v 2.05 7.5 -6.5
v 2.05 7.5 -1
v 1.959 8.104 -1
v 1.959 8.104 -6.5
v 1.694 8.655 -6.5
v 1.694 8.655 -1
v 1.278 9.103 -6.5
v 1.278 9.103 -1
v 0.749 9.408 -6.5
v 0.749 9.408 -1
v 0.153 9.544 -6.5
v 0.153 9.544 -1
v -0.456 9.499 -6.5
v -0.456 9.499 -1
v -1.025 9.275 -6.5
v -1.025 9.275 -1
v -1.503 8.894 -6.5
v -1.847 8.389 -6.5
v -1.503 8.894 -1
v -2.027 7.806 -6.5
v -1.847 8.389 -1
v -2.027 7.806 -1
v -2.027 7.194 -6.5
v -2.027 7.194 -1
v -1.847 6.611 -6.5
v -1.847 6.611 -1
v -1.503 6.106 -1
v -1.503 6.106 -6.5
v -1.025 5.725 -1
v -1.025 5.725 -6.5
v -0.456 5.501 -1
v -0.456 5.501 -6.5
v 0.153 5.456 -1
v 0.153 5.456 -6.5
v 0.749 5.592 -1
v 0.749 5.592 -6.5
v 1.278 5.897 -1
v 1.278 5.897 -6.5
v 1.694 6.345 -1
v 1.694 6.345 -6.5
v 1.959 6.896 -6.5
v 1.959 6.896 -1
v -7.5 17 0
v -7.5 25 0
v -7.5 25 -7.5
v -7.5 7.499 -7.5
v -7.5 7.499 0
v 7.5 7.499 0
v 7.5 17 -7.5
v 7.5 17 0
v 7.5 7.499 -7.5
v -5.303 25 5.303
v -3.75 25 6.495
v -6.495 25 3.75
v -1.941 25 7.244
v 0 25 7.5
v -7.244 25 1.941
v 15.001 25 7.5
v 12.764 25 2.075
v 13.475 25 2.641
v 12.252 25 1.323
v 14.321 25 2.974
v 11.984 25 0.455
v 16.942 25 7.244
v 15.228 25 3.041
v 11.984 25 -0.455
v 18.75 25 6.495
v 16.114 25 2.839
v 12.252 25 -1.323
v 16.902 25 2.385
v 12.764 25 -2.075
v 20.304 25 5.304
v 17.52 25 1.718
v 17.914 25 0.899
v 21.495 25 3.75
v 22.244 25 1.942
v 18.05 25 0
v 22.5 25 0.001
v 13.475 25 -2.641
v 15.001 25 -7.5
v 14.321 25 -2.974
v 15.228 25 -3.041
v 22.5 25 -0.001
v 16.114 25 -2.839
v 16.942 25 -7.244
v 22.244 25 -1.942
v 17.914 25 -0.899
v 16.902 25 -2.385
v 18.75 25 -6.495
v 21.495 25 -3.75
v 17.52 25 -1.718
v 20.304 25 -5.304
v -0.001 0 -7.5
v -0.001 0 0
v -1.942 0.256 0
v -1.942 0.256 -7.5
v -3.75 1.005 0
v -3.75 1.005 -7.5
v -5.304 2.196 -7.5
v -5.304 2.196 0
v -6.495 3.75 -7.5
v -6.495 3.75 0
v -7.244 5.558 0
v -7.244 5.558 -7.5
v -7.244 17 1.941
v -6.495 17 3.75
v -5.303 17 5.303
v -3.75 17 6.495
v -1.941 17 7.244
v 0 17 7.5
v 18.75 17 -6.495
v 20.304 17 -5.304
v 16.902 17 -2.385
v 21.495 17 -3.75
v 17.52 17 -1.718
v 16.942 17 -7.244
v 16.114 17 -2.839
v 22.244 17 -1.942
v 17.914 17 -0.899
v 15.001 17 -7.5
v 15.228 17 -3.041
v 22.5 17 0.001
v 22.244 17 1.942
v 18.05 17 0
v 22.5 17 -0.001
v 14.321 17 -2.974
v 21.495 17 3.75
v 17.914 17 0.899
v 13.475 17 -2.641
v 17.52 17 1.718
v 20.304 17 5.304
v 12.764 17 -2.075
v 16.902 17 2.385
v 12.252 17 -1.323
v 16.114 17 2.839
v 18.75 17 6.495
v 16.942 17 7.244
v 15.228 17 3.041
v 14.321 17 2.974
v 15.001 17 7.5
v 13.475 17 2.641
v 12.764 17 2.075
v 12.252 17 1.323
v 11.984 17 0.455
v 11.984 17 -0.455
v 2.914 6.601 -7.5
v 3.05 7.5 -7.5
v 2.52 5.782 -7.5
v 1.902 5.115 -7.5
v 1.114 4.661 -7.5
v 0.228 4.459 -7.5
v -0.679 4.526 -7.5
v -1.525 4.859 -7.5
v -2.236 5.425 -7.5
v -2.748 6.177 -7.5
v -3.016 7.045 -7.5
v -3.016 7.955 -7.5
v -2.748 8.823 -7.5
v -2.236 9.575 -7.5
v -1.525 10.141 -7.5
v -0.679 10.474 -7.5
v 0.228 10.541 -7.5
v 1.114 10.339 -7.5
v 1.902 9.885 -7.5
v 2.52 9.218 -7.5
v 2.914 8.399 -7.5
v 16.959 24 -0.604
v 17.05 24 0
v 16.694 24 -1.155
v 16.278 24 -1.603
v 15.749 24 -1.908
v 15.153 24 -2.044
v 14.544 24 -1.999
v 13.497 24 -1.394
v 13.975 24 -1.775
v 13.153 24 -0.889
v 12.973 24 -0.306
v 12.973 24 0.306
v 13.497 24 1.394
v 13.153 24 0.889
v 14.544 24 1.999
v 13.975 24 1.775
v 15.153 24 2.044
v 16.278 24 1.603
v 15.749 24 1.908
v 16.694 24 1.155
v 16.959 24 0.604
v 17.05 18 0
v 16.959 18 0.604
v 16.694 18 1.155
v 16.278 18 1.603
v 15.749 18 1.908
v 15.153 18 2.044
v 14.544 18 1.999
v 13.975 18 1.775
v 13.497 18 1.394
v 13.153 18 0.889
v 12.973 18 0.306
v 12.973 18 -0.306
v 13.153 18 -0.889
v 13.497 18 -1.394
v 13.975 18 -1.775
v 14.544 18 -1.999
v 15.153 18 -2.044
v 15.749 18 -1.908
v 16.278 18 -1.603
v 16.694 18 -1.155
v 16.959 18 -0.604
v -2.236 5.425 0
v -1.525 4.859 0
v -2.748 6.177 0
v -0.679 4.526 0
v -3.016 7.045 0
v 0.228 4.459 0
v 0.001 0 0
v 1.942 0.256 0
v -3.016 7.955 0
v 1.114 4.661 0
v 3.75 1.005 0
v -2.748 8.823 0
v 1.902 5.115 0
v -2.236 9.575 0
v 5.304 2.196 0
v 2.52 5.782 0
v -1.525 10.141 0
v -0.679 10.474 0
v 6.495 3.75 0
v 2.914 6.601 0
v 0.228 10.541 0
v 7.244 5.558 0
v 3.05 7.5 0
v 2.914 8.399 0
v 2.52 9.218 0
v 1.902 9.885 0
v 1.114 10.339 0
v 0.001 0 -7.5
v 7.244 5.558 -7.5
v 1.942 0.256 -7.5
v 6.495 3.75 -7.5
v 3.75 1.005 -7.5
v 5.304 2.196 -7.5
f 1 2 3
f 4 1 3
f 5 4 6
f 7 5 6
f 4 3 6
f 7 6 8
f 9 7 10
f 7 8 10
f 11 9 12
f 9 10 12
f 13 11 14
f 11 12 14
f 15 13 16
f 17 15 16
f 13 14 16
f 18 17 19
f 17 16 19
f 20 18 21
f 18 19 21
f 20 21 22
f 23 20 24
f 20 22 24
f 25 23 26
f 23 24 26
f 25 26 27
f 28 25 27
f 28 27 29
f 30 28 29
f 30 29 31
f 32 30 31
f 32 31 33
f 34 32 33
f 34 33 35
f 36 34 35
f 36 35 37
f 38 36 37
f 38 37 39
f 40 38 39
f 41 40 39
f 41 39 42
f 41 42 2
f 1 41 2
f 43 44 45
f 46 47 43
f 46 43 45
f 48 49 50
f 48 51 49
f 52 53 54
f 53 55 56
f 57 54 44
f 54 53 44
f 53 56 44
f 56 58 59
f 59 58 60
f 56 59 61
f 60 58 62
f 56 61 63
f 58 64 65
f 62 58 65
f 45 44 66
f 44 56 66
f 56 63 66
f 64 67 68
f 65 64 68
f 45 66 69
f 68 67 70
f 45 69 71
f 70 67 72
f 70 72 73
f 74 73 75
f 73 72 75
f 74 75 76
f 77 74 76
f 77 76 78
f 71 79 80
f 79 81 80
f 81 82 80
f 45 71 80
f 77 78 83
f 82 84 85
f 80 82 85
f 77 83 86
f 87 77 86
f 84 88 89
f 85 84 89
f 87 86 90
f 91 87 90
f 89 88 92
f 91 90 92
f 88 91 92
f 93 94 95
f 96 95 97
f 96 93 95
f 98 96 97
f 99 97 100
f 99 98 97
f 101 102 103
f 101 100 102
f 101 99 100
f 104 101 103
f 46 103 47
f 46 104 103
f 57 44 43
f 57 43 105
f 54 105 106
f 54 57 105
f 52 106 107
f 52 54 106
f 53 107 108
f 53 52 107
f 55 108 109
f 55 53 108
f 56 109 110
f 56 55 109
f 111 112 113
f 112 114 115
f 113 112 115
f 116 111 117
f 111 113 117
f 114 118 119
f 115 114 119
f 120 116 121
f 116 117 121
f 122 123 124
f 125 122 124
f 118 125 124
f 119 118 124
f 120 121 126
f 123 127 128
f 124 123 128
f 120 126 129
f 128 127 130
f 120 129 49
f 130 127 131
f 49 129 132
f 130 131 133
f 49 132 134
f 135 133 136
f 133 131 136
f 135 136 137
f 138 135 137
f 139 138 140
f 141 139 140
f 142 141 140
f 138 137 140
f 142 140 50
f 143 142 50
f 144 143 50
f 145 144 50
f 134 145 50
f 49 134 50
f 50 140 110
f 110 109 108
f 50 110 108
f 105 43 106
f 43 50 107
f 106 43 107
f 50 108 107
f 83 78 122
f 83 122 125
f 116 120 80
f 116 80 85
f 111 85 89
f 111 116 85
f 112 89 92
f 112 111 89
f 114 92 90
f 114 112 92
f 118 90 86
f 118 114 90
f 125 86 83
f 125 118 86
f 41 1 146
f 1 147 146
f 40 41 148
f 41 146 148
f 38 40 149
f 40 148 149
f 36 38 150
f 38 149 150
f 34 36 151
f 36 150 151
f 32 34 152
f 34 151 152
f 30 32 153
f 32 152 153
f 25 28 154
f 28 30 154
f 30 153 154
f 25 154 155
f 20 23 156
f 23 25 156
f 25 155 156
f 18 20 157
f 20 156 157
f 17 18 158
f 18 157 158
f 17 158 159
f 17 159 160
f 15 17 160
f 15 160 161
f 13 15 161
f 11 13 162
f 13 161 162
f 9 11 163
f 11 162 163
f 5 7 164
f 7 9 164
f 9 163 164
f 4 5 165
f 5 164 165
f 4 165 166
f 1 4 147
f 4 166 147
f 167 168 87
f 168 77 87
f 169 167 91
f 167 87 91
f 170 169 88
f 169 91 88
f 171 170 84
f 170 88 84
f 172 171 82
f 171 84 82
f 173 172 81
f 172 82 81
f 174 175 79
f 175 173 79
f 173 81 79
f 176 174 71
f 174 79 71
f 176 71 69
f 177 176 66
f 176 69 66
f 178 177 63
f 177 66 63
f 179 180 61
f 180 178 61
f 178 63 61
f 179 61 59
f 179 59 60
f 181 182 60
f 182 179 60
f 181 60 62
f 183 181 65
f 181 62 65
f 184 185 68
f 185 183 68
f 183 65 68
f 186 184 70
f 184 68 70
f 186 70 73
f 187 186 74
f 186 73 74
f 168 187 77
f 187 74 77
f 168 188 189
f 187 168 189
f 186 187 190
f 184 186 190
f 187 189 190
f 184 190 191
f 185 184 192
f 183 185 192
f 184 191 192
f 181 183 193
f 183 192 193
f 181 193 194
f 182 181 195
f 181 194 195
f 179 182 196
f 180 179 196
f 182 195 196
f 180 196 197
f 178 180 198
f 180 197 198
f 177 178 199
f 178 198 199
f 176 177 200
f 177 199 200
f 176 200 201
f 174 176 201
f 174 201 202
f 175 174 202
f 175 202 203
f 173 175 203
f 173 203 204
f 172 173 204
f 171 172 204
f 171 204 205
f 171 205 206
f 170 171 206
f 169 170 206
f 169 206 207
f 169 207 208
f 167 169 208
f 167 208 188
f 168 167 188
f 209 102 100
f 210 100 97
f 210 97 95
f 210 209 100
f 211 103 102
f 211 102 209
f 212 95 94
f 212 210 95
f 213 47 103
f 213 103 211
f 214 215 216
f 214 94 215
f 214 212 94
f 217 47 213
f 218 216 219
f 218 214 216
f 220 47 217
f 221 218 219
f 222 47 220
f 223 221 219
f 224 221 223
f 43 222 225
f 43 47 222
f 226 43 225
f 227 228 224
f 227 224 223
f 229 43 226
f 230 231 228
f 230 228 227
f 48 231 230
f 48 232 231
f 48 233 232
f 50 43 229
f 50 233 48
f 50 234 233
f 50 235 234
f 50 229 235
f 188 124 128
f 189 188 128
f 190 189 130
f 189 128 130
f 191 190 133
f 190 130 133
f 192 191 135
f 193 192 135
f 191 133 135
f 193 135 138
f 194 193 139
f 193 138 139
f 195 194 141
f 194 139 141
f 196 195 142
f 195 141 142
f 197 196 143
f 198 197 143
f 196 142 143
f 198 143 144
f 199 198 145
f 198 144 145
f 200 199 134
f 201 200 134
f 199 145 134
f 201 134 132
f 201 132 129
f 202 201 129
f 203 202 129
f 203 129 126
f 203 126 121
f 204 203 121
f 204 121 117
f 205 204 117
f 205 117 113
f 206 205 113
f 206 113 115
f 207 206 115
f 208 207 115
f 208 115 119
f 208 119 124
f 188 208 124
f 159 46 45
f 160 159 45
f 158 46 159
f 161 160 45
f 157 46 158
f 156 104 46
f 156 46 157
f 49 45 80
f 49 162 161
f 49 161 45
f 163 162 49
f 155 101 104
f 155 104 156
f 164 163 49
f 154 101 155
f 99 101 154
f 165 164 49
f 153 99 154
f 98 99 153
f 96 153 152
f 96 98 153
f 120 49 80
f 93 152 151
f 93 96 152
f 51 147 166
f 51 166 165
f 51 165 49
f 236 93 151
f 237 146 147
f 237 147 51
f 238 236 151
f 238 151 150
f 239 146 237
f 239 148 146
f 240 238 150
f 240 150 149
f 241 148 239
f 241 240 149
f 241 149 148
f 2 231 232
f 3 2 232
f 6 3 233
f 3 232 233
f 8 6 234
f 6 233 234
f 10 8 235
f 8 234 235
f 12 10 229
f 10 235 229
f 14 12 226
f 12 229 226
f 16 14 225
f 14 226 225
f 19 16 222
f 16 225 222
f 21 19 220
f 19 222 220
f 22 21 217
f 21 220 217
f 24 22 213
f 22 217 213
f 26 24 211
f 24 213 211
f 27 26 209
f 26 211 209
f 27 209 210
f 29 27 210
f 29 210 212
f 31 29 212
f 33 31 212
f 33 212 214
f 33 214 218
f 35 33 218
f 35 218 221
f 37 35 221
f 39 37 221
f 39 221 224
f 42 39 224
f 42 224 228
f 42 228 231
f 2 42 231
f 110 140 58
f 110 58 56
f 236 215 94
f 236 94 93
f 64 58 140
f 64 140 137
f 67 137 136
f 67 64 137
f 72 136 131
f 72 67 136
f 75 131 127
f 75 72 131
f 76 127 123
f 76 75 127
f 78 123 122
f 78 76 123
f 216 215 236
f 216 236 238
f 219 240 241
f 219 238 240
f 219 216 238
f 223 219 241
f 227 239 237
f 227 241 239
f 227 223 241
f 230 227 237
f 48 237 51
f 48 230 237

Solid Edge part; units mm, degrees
sketch "Sketch1" plane through (0, 0, 0) normal (0, -1, 0) x (1, 0, 0)
  line L0 (-7.5, -7.5) -> (7.5, -7.5)
  line L1 (7.5, -7.5) -> (7.5, 7.5)
  line L2 (7.5, 7.5) -> (-7.5, 7.5)
  line L3 (-7.5, 7.5) -> (-7.5, -7.5)
  dimension "D1" = 15
  dimension "D2" = 15
extrude "Protrusion1" add sketch "Sketch1" against normal blind 25
sketch "Sketch2" plane through (0, 12.5, 7.5) normal (0, 0, 1) x (1, 0, 0)
  line L0 (-7.5, -12.5) -> (7.5, -12.5)
  line L1 (7.5, -12.5) -> (7.5, 4.5)
  line L2 (7.5, 4.5) -> (-7.5, 4.5)
  line L3 (-7.5, 4.5) -> (-7.5, -12.5)
  dimension "D1" = 17
extrude "Extrusionsausschnitt_1" cut sketch "Sketch2" against normal blind 7.5
fillet "Verrundung_1" radius 7.5 2 edges at (7.5, 0, -3.75) (-7.5, 0, -3.75)
sketch "Sketch3" plane through (0, 8.5, 0) normal (0, 0, 1) x (1, 0, 0)
  circle A0 centre (0, -1) radius 2.05
  dimension "D1" = 4.1
extrude "Cutout1" cut sketch "Sketch3" against normal through all
chamfer "Fase_1" distance 1 angle 45 2 edges at (-2.05, 7.5, 0) (2.05, 7.5, -7.5)
sketch "Sketch4" plane through (7.5, 16.25, 0) normal (1, 0, 0) x (0, 1, 0)
  line L0 (0.75, 7.5) -> (8.75, 7.5)
  line L1 (8.75, 7.5) -> (8.75, -7.5)
  line L2 (8.75, -7.5) -> (0.75, -7.5)
  line L3 (0.75, -7.5) -> (0.75, 7.5)
extrude "Extrusionsausprägung_2" add sketch "Sketch4" along normal blind 15
fillet "Verrundung_2" radius 7.5 2 edges at (22.5, 21, 7.5) (22.5, 21, -7.5)
sketch "Sketch5" plane through (7.5, 17, 0) normal (0, -1, 0) x (1, 0, 0)
  circle A0 centre (7.5, 0) radius 2.05
  dimension "D1" = 4.1
extrude "Cutout2" cut sketch "Sketch5" against normal through all
chamfer "Fase_2" distance 1 angle 45 2 edges at (12.95, 17, 0) (15, 25, 2.05)
fillet "Verrundung_3" radius 7.5 1 edges at (-7.5, 21, 7.5)
